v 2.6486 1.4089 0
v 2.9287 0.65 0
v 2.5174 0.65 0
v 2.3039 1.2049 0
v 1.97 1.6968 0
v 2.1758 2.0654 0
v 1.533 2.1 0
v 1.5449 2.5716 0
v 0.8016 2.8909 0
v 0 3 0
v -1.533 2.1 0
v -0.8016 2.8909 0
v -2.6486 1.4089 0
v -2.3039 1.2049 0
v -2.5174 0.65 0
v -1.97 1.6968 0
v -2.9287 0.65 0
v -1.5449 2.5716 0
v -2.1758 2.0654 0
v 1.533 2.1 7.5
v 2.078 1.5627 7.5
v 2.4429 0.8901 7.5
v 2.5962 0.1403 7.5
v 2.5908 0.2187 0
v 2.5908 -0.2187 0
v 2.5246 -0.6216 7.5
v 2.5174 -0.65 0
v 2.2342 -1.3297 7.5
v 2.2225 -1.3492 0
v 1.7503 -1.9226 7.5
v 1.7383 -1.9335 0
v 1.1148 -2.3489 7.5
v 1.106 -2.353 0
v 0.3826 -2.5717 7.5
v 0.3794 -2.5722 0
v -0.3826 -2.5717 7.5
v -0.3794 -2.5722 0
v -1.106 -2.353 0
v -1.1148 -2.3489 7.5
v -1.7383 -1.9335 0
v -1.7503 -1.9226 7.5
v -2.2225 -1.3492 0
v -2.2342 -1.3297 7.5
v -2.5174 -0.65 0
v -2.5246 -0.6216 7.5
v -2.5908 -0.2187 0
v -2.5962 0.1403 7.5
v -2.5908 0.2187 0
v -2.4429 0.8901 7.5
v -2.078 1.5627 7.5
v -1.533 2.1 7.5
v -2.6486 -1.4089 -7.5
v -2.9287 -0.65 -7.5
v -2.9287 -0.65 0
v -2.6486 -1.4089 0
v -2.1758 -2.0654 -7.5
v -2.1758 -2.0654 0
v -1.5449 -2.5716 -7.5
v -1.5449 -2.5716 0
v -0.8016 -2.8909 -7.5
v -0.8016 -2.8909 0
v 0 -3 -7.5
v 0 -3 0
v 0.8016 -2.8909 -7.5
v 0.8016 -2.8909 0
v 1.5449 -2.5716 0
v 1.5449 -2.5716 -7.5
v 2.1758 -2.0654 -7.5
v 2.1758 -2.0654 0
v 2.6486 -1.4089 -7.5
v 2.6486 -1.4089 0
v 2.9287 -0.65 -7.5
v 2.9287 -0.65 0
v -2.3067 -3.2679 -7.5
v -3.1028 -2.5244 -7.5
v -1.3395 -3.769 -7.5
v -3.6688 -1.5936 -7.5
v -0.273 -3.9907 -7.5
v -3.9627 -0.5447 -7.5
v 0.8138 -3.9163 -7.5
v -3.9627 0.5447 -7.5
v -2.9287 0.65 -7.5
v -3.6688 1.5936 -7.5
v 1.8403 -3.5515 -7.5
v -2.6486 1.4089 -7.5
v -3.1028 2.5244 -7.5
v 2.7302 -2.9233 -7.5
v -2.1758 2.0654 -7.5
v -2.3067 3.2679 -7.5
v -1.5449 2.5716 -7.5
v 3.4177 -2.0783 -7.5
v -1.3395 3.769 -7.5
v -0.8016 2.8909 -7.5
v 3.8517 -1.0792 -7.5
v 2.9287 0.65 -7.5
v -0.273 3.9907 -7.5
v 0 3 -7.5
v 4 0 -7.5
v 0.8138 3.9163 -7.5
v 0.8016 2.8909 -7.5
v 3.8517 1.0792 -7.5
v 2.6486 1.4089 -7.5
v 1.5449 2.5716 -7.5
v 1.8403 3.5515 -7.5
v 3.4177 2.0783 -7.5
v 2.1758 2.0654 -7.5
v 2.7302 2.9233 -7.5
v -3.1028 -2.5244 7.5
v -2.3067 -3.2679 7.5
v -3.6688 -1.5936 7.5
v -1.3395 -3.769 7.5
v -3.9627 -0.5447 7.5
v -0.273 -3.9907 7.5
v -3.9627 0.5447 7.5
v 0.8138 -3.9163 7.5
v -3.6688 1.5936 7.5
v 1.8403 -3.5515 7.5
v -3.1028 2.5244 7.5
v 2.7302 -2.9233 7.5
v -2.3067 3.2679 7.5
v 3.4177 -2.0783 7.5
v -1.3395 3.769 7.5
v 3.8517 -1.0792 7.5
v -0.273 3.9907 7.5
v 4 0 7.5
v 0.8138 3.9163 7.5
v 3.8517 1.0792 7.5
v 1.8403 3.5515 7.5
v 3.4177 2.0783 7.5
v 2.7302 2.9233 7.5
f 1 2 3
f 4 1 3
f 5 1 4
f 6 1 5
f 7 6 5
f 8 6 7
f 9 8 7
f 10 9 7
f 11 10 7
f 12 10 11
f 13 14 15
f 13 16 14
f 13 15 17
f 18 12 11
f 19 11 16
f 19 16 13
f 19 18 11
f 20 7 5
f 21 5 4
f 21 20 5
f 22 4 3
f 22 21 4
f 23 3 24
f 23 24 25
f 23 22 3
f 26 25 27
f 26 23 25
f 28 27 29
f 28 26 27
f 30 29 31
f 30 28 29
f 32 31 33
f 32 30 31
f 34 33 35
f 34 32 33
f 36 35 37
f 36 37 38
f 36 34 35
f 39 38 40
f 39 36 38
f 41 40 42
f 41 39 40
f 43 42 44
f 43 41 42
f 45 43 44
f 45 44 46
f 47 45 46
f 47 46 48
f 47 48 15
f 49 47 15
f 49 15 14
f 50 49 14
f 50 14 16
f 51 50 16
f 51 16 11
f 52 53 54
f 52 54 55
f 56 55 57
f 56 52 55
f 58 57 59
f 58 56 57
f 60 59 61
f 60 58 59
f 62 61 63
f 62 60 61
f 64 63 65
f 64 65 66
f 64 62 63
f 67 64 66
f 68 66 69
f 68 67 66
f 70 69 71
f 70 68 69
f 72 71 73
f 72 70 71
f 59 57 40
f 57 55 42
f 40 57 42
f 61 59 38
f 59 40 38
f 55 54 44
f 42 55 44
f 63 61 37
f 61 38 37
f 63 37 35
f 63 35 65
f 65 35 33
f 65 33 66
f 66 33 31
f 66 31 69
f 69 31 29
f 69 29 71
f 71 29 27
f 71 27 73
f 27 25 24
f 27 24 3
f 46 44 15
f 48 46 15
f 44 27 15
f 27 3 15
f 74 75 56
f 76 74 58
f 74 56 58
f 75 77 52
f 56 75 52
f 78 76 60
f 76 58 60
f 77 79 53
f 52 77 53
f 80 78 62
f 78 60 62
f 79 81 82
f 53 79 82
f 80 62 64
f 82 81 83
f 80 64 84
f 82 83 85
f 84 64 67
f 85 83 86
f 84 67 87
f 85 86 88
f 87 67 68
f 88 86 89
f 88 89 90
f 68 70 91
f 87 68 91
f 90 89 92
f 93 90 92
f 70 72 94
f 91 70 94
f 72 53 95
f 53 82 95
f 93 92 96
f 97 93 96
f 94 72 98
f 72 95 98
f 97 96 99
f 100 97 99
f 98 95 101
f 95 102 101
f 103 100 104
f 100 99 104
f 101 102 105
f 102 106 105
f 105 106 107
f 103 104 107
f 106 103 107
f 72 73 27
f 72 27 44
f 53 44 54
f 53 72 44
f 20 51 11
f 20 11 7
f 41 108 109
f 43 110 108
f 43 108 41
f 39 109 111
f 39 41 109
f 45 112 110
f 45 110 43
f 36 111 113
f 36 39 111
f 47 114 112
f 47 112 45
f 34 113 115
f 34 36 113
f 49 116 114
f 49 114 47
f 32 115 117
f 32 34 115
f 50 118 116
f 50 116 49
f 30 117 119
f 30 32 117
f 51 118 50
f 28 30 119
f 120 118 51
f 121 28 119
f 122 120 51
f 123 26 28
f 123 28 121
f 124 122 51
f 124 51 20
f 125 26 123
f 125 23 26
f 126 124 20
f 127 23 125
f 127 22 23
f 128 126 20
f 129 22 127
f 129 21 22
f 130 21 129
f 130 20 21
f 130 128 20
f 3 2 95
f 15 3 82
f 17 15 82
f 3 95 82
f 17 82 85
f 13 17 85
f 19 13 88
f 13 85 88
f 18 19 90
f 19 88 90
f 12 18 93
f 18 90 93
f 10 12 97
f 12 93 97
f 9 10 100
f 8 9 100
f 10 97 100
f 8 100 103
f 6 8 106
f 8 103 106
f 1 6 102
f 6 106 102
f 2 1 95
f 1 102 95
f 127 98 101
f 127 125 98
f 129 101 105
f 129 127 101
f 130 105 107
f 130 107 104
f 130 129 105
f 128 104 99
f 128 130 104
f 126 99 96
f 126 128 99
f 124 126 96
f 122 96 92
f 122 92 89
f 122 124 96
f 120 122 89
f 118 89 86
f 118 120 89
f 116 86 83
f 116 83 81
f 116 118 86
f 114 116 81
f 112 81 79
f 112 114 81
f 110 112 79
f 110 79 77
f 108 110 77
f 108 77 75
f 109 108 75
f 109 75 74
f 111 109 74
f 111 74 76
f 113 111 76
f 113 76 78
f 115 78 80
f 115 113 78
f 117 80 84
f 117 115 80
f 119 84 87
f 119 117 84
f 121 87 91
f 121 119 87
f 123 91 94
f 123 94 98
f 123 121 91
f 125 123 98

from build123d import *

# Parameters (mm, degrees)
CROQUIS1_R              = 4
SALIENTE_EXTRUIR1_DEPTH = 7.5
CORTAR_EXTRUIR1_DEPTH   = 7.5
CORTAR_EXTRUIR2_DEPTH   = 7.5


with BuildPart() as part:
    # Croquis1 → Saliente-Extruir1 (new body, symmetric)
    with BuildSketch(Plane.XY):
        Circle(CROQUIS1_R)
    extrude(amount=SALIENTE_EXTRUIR1_DEPTH, both=True)

    # Croquis2 → Cortar-Extruir1 (cut)
    with BuildSketch(Plane.XY.offset(7.5)):
        with BuildLine():
            Line((-1.532970972, 2.1), (1.532970972, 2.1))
            ThreePointArc((1.532970972, 2.1), (0, -2.6), (-1.532970972, 2.1))
        make_face()
    extrude(amount=-CORTAR_EXTRUIR1_DEPTH, mode=Mode.SUBTRACT)

    # Croquis3 → Cortar-Extruir2 (cut)
    with BuildSketch(Plane(origin=(0, 0, -7.5), x_dir=(-1, 0, 0), z_dir=(0, 0, -1))):
        with BuildLine():
            Line((-2.928736929, 0.65), (2.928736929, 0.65))
            ThreePointArc((2.928736929, 0.65), (0, 3), (-2.928736929, 0.65))
        make_face()
        with BuildLine():
            Line((-2.928736929, -0.65), (2.928736929, -0.65))
            ThreePointArc((2.928736929, -0.65), (0, -3), (-2.928736929, -0.65))
        make_face()
    extrude(amount=-CORTAR_EXTRUIR2_DEPTH, mode=Mode.SUBTRACT)


solid = part.part
